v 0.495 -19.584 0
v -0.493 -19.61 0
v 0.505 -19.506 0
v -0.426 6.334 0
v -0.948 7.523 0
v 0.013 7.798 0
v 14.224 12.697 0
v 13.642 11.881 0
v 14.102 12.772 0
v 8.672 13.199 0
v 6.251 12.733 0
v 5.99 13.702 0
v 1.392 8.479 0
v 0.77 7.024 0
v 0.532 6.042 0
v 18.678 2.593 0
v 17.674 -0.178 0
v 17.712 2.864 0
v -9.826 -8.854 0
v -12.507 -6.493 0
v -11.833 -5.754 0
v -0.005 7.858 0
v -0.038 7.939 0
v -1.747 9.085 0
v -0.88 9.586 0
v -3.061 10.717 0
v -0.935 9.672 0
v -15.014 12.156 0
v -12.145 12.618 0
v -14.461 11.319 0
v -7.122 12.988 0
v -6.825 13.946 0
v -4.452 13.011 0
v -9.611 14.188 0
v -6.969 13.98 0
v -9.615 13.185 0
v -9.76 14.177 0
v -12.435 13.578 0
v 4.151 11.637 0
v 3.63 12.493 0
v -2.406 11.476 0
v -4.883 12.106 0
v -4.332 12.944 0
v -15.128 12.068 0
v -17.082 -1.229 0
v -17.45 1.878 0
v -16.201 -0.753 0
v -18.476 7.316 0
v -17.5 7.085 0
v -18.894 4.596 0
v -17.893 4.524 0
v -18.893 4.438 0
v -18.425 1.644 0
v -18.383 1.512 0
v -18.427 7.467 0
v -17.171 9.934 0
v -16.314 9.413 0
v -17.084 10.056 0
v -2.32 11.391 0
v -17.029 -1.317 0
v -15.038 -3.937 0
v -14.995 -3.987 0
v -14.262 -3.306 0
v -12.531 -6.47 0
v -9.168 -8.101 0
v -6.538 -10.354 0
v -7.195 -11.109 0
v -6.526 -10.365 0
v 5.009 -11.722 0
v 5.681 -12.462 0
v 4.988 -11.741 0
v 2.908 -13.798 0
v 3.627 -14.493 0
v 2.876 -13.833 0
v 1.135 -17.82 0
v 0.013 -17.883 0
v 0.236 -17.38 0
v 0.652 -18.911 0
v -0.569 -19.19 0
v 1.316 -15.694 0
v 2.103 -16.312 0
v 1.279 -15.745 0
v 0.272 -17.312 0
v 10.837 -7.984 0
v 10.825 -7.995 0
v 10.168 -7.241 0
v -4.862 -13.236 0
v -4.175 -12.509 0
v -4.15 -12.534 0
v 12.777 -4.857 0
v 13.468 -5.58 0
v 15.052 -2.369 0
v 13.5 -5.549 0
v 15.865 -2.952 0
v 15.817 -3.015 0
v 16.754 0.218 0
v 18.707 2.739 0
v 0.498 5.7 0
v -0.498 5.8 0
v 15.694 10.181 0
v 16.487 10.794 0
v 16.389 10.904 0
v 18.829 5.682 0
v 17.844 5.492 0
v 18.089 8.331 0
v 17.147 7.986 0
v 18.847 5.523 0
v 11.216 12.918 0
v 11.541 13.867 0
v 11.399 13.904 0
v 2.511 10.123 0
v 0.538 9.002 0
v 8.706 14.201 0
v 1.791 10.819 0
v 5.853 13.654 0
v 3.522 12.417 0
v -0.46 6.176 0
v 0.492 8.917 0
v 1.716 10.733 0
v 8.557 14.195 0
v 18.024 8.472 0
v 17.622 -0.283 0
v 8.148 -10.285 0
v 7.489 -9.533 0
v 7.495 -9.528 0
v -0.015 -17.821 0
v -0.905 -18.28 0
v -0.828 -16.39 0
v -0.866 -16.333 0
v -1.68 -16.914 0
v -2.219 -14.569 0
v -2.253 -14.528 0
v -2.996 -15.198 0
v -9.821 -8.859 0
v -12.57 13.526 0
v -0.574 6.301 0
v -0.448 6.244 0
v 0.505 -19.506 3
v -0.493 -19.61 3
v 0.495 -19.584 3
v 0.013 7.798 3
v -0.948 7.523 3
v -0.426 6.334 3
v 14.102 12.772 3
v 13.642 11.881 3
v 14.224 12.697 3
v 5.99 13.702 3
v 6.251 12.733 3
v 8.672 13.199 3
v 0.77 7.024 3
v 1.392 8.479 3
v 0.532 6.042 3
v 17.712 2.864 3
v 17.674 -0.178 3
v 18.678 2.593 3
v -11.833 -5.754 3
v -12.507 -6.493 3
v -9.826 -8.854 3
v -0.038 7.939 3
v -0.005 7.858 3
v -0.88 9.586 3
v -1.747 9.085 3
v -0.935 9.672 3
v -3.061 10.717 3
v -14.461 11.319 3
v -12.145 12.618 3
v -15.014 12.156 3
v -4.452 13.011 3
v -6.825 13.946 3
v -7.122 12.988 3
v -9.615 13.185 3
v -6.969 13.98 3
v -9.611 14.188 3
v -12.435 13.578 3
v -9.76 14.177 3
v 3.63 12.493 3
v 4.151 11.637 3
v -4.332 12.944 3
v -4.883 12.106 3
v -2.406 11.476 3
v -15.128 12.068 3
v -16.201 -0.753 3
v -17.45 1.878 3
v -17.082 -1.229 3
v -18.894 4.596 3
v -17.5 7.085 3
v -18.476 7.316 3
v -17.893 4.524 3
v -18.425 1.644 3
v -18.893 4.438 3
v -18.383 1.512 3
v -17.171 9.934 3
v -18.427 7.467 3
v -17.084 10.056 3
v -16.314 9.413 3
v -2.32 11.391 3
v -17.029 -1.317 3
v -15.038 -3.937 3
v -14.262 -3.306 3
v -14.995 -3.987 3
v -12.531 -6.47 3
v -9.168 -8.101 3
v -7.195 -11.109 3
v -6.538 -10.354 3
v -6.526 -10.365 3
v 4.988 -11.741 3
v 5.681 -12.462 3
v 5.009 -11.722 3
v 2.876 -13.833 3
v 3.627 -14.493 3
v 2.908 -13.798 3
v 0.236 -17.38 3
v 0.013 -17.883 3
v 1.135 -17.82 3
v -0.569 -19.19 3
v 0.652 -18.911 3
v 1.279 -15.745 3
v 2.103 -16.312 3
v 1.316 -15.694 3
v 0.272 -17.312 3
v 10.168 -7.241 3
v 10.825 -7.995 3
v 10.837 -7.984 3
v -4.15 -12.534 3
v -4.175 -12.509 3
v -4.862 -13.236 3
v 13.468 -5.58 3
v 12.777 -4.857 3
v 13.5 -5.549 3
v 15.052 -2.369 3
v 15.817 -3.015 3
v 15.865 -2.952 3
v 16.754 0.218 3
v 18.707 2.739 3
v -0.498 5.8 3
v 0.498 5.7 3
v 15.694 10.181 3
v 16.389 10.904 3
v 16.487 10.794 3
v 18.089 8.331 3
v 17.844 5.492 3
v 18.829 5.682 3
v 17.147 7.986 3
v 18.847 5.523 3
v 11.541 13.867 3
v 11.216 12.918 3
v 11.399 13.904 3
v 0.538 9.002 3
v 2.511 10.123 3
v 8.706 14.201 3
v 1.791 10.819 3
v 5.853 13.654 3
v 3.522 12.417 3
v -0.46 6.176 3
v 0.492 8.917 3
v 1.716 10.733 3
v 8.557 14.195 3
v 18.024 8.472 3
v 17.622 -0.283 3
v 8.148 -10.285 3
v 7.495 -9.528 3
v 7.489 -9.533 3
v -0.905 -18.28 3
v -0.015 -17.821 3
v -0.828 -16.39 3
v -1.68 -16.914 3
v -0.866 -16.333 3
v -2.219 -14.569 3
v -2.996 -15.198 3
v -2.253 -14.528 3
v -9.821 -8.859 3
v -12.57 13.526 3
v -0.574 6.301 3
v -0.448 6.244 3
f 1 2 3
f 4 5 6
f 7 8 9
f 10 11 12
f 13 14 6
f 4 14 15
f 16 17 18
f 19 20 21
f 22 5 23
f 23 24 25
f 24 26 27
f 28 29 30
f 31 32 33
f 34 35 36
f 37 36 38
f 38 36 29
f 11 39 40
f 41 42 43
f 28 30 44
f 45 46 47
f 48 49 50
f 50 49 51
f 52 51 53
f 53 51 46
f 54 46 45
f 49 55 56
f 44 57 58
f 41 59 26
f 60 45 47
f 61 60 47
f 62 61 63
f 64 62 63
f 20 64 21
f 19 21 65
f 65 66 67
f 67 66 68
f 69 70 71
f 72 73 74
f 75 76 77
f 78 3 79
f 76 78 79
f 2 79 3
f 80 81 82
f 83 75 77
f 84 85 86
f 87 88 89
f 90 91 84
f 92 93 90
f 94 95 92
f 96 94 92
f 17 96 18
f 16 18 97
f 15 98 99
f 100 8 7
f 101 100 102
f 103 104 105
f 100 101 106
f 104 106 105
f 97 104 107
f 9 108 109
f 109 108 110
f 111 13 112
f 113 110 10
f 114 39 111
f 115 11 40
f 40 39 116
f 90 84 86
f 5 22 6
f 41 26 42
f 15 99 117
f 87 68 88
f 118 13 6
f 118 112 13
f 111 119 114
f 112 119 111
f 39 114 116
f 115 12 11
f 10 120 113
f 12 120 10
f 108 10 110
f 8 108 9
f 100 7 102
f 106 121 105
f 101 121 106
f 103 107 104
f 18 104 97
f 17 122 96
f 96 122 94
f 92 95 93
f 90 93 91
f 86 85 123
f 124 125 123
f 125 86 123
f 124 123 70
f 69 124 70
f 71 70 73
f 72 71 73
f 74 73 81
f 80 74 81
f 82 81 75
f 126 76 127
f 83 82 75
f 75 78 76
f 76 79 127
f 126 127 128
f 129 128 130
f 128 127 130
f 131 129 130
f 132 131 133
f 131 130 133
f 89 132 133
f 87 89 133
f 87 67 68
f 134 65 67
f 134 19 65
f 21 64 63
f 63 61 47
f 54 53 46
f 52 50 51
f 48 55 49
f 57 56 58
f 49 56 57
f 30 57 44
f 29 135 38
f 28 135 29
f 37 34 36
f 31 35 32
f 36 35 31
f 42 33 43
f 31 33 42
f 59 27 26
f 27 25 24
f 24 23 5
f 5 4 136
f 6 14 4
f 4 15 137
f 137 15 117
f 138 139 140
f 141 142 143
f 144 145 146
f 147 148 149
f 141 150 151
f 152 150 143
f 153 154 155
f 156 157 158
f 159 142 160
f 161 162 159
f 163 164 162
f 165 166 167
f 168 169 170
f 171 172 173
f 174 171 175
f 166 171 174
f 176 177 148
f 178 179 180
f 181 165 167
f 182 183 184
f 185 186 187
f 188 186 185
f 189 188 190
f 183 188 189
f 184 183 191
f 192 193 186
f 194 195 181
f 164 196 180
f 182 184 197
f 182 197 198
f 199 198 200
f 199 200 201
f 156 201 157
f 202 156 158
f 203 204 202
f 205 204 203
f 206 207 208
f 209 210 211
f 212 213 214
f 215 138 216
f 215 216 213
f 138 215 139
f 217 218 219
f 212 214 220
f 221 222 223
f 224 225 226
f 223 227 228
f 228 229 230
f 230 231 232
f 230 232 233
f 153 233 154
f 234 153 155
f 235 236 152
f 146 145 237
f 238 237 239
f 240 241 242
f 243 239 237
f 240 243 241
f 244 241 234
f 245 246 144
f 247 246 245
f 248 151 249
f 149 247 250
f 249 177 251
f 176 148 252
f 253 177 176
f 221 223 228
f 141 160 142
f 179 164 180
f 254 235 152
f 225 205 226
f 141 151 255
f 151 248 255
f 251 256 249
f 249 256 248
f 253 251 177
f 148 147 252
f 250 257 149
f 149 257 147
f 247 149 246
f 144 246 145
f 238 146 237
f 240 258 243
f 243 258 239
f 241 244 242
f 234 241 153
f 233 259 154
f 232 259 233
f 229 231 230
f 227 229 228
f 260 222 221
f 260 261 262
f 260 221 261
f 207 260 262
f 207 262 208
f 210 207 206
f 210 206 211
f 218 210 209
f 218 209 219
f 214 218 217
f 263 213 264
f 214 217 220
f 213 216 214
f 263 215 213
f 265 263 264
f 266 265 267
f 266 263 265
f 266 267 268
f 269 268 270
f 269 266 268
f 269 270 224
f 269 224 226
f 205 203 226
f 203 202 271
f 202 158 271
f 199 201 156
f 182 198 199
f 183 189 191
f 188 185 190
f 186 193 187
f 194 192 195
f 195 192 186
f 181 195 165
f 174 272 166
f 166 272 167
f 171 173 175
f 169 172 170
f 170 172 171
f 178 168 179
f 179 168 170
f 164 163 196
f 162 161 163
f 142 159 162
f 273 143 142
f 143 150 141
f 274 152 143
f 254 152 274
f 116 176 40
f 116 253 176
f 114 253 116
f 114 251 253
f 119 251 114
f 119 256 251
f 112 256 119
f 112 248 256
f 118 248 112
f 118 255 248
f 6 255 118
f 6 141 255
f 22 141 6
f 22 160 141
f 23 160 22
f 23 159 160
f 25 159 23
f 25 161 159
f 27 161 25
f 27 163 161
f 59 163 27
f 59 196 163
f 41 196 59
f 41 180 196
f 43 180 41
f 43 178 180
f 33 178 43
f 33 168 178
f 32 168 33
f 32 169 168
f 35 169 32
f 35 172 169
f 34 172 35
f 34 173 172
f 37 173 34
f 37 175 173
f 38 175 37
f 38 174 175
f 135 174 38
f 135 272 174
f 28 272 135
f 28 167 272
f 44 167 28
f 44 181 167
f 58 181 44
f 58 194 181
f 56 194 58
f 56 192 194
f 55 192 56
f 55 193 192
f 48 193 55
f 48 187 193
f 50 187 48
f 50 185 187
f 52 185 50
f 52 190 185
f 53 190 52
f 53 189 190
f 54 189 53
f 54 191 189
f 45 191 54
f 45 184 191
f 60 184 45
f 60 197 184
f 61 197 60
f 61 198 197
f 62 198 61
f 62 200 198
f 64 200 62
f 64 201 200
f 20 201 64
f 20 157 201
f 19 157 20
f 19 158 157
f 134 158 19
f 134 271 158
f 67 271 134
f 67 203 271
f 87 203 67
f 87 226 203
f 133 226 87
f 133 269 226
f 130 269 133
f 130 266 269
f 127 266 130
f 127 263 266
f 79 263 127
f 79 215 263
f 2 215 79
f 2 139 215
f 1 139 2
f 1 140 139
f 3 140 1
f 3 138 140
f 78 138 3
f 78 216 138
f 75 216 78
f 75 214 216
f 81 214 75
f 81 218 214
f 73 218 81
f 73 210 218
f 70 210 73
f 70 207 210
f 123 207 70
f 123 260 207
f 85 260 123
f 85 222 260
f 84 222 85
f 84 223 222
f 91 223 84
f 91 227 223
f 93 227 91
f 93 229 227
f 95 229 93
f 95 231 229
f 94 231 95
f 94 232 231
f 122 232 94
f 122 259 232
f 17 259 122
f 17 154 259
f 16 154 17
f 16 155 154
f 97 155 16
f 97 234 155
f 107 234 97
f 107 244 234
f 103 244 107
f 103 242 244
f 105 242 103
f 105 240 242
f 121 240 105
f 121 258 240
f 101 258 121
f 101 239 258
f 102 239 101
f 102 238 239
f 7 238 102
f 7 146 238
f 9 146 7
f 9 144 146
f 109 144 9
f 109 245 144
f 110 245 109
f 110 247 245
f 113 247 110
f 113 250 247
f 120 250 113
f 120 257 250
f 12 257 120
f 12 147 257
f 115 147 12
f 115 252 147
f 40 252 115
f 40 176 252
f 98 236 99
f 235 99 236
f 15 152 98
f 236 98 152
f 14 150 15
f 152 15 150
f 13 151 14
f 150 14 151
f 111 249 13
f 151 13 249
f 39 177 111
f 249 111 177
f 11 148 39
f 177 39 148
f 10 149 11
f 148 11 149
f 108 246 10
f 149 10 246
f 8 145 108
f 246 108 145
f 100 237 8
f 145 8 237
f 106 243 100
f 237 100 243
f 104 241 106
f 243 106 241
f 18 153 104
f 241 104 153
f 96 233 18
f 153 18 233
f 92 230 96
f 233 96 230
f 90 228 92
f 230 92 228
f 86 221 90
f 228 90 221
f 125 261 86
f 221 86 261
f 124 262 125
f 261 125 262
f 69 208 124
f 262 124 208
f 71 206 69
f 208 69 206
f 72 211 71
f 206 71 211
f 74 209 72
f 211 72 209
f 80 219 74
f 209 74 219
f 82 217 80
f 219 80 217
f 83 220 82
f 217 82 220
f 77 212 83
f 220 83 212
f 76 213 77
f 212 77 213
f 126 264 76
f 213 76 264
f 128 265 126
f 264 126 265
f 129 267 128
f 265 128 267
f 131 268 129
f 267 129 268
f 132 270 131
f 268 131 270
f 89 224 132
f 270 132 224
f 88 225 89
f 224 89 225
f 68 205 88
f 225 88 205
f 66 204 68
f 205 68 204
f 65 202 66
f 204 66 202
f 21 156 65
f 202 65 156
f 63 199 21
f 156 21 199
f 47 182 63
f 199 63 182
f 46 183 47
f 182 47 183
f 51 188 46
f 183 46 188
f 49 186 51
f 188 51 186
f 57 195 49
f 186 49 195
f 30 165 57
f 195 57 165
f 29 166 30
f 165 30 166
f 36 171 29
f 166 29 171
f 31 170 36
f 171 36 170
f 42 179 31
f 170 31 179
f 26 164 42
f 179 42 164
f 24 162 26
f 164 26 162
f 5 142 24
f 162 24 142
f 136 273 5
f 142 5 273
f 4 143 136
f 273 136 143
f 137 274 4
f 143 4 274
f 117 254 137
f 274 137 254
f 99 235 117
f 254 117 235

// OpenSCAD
// [FL_INDEX: keywords="openscad, 3d_parametric, Broken_Hearts, csg_solid" | COT="Parametric OpenSCAD design from 3DCodeverse"]
// Title: Broken Hearts

// mathgrrl broken heart - OpenSCAD parametric graph example

/////////////////////////////////////////////////////////////
// EXTENSIONS ///////////////////////////////////////////////

// curriculum.makerbot.com/daily_tutorial/openscad/openscad_05.html
// include <EXTENSIONS/2dgraph.scad>

/////////////////////////////////////////////////////////////
// PARAMETERS ///////////////////////////////////////////////

// Set the diameter of the heart, in mm
heart_diameter = 20;

// Set the thickness of the line, in mm
line_thickness = 1;

// Set the height of the model, in mm
line_height = 3;

// Choose low numbers for jagged, high for smooth
number_of_steps = 48;

scalefactor = heart_diameter*1.15/20;

/////////////////////////////////////////////////////////////
// RENDERS //////////////////////////////////////////////////

// broken heart parametric curve
// equation from http://mathworld.wolfram.com/HeartCurve.html
function x(t) = scalefactor*16*pow(sin(t),3);
function y(t) = scalefactor*(13*cos(t)-5*cos(2*t)-2*cos(3*t)-cos(4*t));

// make the graph and extrude it
linear_extrude(height=line_height)
	2dgraph(	[0, 350], 				// stop before 360 to make broken
				line_thickness, 		// set line thickness
				steps=number_of_steps,// choose low/high poly look
				parametric=true);		// use parametric grapher

/////////////////////////////////////////////////////////////
// MODULES //////////////////////////////////////////////////

// in Customizer we need to include these to use 2dgraph?
// curriculum.makerbot.com/daily_tutorial/openscad/openscad_05.html

// These functions are here to help get the slope of each segment, and use that to find points for a correctly oriented polygon
function diffx(x1, y1, x2, y2, th) = cos(atan((y2-y1)/(x2-x1)) + 90)*(th/2);
function diffy(x1, y1, x2, y2, th) = sin(atan((y2-y1)/(x2-x1)) + 90)*(th/2);
function point1(x1, y1, x2, y2, th) = [x1-diffx(x1, y1, x2, y2, th), y1-diffy(x1, y1, x2, y2, th)];
function point2(x1, y1, x2, y2, th) = [x2-diffx(x1, y1, x2, y2, th), y2-diffy(x1, y1, x2, y2, th)];
function point3(x1, y1, x2, y2, th) = [x2+diffx(x1, y1, x2, y2, th), y2+diffy(x1, y1, x2, y2, th)];
function point4(x1, y1, x2, y2, th) = [x1+diffx(x1, y1, x2, y2, th), y1+diffy(x1, y1, x2, y2, th)];
function polarX(theta) = cos(theta)*r(theta);
function polarY(theta) = sin(theta)*r(theta);

module nextPolygon(x1, y1, x2, y2, x3, y3, th) {
    if((x2 > x1 && x2-diffx(x2, y2, x3, y3, th) < x2-diffx(x1, y1, x2, y2, th) || (x2 <= x1 && x2-diffx(x2, y2, x3, y3, th) > x2-diffx(x1, y1, x2, y2, th)))) {
        polygon(
            points = [
                point1(x1, y1, x2, y2, th),
                point2(x1, y1, x2, y2, th),
                // This point connects this segment to the next
                point4(x2, y2, x3, y3, th),
                point3(x1, y1, x2, y2, th),
                point4(x1, y1, x2, y2, th)
            ],
            paths = [[0,1,2,3,4]]
        );
    }
    else if((x2 > x1 && x2-diffx(x2, y2, x3, y3, th) > x2-diffx(x1, y1, x2, y2, th) || (x2 <= x1 && x2-diffx(x2, y2, x3, y3, th) < x2-diffx(x1, y1, x2, y2, th)))) {
        polygon(
            points = [
                point1(x1, y1, x2, y2, th),
                point2(x1, y1, x2, y2, th),
                // This point connects this segment to the next
                point1(x2, y2, x3, y3, th),
                point3(x1, y1, x2, y2, th),
                point4(x1, y1, x2, y2, th)
            ],
            paths = [[0,1,2,3,4]]
        );
    }
    else {
        polygon(
            points = [
                point1(x1, y1, x2, y2, th),
                point2(x1, y1, x2, y2, th),
                point3(x1, y1, x2, y2, th),
                point4(x1, y1, x2, y2, th)
            ],
            paths = [[0,1,2,3]]
        );
    }
}

module 2dgraph(bounds=[-10,10], th=2, steps=10, polar=false, parametric=false) {

    step = (bounds[1]-bounds[0])/steps;
    union() {
        for(i = [bounds[0]:step:bounds[1]-step]) {
            if(polar) {
                nextPolygon(polarX(i), polarY(i), polarX(i+step), polarY(i+step), polarX(i+2*step), polarY(i+2*step), th);
            }
            else if(parametric) {
                nextPolygon(x(i), y(i), x(i+step), y(i+step), x(i+2*step), y(i+2*step), th);
            }
            else {
                nextPolygon(i, f(i), i+step, f(i+step), i+2*step, f(i+2*step), th);
            }
        }
    }
}
